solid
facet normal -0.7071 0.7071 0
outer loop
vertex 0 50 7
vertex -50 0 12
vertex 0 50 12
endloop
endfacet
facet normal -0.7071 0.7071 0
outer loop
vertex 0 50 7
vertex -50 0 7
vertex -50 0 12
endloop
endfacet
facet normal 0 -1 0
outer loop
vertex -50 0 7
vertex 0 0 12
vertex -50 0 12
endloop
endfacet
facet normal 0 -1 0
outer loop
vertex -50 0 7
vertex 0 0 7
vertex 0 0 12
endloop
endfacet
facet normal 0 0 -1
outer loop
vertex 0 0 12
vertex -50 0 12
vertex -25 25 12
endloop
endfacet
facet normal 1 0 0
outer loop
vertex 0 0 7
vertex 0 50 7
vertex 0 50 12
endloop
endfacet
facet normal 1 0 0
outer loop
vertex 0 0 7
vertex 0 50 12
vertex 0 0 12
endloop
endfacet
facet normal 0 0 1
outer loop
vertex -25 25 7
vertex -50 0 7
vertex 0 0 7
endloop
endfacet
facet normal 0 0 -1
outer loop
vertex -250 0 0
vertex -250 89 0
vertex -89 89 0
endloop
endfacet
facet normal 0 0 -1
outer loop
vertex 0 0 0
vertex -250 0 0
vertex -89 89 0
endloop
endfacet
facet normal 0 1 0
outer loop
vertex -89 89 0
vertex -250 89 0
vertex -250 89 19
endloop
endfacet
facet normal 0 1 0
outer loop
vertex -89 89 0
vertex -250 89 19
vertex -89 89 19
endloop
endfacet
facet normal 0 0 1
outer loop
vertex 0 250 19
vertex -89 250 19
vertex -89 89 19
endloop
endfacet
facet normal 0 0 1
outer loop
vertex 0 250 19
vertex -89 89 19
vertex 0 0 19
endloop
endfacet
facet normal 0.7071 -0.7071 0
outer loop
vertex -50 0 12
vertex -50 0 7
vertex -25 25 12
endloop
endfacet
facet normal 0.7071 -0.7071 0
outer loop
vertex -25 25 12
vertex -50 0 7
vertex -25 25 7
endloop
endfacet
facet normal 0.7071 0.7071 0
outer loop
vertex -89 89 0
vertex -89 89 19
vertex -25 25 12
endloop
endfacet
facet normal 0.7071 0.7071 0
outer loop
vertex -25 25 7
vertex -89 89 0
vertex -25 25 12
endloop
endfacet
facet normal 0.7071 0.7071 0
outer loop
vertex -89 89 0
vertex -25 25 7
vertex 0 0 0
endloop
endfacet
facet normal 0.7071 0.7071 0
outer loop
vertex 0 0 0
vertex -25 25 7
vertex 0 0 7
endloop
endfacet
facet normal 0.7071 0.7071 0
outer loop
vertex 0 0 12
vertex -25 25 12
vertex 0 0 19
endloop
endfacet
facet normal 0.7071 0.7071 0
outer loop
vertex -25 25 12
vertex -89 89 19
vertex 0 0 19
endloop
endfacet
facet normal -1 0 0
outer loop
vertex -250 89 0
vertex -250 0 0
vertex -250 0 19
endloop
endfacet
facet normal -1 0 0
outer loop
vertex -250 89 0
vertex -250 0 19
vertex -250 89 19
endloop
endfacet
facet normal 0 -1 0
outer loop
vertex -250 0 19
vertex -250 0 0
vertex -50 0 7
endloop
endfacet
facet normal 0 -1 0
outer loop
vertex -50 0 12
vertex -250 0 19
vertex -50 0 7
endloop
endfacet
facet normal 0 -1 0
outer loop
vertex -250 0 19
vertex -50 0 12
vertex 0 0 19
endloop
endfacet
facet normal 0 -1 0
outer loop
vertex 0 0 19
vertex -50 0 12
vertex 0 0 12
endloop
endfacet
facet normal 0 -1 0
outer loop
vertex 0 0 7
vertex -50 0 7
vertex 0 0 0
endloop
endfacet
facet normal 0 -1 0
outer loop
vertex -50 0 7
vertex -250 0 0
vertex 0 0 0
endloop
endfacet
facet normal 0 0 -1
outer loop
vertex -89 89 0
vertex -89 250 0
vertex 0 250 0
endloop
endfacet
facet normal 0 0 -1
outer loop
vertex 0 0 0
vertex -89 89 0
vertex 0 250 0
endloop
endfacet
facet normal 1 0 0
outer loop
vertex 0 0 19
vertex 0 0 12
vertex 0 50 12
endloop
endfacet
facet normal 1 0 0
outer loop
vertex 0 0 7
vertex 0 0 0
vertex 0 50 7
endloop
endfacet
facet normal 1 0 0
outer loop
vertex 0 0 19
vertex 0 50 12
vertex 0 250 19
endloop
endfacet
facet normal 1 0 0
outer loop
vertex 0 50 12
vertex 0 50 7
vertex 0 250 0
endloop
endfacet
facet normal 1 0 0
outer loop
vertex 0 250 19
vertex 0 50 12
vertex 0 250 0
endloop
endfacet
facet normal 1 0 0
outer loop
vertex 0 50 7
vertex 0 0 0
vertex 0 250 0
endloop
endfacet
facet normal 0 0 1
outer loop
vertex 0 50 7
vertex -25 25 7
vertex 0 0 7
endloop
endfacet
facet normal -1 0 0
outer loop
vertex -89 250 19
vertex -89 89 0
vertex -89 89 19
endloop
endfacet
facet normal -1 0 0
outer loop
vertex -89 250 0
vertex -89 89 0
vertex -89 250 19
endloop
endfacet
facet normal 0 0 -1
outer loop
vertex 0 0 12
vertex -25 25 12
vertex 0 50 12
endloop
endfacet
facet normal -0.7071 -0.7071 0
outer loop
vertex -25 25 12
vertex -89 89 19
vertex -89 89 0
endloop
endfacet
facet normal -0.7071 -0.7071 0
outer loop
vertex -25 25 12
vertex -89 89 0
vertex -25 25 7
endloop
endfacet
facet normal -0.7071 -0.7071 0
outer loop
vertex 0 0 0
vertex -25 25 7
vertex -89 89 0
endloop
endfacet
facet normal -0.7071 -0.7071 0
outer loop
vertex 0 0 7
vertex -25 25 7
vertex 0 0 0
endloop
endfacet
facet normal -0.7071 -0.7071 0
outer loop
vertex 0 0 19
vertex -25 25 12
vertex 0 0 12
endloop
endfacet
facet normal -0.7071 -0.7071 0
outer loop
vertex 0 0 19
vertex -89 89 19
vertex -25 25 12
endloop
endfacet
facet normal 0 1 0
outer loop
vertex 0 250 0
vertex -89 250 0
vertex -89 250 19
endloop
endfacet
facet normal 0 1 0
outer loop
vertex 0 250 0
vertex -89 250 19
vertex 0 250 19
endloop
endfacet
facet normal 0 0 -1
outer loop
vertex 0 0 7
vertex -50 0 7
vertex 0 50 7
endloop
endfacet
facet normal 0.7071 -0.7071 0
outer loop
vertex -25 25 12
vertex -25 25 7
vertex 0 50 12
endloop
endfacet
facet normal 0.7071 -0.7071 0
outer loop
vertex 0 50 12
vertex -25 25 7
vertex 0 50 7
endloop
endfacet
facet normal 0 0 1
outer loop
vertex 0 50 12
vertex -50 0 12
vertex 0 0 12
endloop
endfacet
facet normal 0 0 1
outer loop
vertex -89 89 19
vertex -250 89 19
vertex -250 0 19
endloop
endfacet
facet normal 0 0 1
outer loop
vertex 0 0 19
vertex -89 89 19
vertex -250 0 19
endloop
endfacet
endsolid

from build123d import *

# Parameters (mm, degrees)
F0_W     = 250
F0_H     = 89
F1_DEPTH = 19
F2_W     = 89
F2_H     = 250
F3_DEPTH = 19
F5_DEPTH = 19.001
F9_DEPTH = 2.5


with BuildPart() as f1:
    # F0 (on Top) → F1 (new body)
    with BuildSketch(Plane.XY):
        with Locations((-125, 44.5)):
            Rectangle(F0_W, F0_H)
    extrude(amount=F1_DEPTH)

    # F4 (on face) → F5 (cut, through all)
    with BuildSketch(Plane.XY.offset(19)):
        Polygon((-89, 89), (0, 0), (0, 89), align=None)
    extrude(amount=-F5_DEPTH, mode=Mode.SUBTRACT)


with BuildPart() as f3:
    # F2 (on Top) → F3 (new body)
    with BuildSketch(Plane.XY):
        with Locations((-44.5, 125)):
            Rectangle(F2_W, F2_H)
    extrude(amount=F3_DEPTH)

    # F6: cut F1
    add(f1.part, mode=Mode.SUBTRACT)


with BuildPart() as f9:
    # F8 (on mid) → F9 (new body, symmetric)
    with BuildSketch(Plane(origin=(0, 0, 9.5), x_dir=(1, 0, 0), z_dir=(0, 0, -1))):
        Polygon((-50, 0), (0, -50), (0, 0), align=None)
    extrude(amount=F9_DEPTH, both=True)


with BuildPart() as f1_1:
    add(f1.part)

    # F10: cut F9
    add(f9.part, mode=Mode.SUBTRACT)


with BuildPart() as f3_1:
    add(f3.part)

    # F10: cut F9
    add(f9.part, mode=Mode.SUBTRACT)


solid = Compound([f9.part, f1_1.part, f3_1.part])
